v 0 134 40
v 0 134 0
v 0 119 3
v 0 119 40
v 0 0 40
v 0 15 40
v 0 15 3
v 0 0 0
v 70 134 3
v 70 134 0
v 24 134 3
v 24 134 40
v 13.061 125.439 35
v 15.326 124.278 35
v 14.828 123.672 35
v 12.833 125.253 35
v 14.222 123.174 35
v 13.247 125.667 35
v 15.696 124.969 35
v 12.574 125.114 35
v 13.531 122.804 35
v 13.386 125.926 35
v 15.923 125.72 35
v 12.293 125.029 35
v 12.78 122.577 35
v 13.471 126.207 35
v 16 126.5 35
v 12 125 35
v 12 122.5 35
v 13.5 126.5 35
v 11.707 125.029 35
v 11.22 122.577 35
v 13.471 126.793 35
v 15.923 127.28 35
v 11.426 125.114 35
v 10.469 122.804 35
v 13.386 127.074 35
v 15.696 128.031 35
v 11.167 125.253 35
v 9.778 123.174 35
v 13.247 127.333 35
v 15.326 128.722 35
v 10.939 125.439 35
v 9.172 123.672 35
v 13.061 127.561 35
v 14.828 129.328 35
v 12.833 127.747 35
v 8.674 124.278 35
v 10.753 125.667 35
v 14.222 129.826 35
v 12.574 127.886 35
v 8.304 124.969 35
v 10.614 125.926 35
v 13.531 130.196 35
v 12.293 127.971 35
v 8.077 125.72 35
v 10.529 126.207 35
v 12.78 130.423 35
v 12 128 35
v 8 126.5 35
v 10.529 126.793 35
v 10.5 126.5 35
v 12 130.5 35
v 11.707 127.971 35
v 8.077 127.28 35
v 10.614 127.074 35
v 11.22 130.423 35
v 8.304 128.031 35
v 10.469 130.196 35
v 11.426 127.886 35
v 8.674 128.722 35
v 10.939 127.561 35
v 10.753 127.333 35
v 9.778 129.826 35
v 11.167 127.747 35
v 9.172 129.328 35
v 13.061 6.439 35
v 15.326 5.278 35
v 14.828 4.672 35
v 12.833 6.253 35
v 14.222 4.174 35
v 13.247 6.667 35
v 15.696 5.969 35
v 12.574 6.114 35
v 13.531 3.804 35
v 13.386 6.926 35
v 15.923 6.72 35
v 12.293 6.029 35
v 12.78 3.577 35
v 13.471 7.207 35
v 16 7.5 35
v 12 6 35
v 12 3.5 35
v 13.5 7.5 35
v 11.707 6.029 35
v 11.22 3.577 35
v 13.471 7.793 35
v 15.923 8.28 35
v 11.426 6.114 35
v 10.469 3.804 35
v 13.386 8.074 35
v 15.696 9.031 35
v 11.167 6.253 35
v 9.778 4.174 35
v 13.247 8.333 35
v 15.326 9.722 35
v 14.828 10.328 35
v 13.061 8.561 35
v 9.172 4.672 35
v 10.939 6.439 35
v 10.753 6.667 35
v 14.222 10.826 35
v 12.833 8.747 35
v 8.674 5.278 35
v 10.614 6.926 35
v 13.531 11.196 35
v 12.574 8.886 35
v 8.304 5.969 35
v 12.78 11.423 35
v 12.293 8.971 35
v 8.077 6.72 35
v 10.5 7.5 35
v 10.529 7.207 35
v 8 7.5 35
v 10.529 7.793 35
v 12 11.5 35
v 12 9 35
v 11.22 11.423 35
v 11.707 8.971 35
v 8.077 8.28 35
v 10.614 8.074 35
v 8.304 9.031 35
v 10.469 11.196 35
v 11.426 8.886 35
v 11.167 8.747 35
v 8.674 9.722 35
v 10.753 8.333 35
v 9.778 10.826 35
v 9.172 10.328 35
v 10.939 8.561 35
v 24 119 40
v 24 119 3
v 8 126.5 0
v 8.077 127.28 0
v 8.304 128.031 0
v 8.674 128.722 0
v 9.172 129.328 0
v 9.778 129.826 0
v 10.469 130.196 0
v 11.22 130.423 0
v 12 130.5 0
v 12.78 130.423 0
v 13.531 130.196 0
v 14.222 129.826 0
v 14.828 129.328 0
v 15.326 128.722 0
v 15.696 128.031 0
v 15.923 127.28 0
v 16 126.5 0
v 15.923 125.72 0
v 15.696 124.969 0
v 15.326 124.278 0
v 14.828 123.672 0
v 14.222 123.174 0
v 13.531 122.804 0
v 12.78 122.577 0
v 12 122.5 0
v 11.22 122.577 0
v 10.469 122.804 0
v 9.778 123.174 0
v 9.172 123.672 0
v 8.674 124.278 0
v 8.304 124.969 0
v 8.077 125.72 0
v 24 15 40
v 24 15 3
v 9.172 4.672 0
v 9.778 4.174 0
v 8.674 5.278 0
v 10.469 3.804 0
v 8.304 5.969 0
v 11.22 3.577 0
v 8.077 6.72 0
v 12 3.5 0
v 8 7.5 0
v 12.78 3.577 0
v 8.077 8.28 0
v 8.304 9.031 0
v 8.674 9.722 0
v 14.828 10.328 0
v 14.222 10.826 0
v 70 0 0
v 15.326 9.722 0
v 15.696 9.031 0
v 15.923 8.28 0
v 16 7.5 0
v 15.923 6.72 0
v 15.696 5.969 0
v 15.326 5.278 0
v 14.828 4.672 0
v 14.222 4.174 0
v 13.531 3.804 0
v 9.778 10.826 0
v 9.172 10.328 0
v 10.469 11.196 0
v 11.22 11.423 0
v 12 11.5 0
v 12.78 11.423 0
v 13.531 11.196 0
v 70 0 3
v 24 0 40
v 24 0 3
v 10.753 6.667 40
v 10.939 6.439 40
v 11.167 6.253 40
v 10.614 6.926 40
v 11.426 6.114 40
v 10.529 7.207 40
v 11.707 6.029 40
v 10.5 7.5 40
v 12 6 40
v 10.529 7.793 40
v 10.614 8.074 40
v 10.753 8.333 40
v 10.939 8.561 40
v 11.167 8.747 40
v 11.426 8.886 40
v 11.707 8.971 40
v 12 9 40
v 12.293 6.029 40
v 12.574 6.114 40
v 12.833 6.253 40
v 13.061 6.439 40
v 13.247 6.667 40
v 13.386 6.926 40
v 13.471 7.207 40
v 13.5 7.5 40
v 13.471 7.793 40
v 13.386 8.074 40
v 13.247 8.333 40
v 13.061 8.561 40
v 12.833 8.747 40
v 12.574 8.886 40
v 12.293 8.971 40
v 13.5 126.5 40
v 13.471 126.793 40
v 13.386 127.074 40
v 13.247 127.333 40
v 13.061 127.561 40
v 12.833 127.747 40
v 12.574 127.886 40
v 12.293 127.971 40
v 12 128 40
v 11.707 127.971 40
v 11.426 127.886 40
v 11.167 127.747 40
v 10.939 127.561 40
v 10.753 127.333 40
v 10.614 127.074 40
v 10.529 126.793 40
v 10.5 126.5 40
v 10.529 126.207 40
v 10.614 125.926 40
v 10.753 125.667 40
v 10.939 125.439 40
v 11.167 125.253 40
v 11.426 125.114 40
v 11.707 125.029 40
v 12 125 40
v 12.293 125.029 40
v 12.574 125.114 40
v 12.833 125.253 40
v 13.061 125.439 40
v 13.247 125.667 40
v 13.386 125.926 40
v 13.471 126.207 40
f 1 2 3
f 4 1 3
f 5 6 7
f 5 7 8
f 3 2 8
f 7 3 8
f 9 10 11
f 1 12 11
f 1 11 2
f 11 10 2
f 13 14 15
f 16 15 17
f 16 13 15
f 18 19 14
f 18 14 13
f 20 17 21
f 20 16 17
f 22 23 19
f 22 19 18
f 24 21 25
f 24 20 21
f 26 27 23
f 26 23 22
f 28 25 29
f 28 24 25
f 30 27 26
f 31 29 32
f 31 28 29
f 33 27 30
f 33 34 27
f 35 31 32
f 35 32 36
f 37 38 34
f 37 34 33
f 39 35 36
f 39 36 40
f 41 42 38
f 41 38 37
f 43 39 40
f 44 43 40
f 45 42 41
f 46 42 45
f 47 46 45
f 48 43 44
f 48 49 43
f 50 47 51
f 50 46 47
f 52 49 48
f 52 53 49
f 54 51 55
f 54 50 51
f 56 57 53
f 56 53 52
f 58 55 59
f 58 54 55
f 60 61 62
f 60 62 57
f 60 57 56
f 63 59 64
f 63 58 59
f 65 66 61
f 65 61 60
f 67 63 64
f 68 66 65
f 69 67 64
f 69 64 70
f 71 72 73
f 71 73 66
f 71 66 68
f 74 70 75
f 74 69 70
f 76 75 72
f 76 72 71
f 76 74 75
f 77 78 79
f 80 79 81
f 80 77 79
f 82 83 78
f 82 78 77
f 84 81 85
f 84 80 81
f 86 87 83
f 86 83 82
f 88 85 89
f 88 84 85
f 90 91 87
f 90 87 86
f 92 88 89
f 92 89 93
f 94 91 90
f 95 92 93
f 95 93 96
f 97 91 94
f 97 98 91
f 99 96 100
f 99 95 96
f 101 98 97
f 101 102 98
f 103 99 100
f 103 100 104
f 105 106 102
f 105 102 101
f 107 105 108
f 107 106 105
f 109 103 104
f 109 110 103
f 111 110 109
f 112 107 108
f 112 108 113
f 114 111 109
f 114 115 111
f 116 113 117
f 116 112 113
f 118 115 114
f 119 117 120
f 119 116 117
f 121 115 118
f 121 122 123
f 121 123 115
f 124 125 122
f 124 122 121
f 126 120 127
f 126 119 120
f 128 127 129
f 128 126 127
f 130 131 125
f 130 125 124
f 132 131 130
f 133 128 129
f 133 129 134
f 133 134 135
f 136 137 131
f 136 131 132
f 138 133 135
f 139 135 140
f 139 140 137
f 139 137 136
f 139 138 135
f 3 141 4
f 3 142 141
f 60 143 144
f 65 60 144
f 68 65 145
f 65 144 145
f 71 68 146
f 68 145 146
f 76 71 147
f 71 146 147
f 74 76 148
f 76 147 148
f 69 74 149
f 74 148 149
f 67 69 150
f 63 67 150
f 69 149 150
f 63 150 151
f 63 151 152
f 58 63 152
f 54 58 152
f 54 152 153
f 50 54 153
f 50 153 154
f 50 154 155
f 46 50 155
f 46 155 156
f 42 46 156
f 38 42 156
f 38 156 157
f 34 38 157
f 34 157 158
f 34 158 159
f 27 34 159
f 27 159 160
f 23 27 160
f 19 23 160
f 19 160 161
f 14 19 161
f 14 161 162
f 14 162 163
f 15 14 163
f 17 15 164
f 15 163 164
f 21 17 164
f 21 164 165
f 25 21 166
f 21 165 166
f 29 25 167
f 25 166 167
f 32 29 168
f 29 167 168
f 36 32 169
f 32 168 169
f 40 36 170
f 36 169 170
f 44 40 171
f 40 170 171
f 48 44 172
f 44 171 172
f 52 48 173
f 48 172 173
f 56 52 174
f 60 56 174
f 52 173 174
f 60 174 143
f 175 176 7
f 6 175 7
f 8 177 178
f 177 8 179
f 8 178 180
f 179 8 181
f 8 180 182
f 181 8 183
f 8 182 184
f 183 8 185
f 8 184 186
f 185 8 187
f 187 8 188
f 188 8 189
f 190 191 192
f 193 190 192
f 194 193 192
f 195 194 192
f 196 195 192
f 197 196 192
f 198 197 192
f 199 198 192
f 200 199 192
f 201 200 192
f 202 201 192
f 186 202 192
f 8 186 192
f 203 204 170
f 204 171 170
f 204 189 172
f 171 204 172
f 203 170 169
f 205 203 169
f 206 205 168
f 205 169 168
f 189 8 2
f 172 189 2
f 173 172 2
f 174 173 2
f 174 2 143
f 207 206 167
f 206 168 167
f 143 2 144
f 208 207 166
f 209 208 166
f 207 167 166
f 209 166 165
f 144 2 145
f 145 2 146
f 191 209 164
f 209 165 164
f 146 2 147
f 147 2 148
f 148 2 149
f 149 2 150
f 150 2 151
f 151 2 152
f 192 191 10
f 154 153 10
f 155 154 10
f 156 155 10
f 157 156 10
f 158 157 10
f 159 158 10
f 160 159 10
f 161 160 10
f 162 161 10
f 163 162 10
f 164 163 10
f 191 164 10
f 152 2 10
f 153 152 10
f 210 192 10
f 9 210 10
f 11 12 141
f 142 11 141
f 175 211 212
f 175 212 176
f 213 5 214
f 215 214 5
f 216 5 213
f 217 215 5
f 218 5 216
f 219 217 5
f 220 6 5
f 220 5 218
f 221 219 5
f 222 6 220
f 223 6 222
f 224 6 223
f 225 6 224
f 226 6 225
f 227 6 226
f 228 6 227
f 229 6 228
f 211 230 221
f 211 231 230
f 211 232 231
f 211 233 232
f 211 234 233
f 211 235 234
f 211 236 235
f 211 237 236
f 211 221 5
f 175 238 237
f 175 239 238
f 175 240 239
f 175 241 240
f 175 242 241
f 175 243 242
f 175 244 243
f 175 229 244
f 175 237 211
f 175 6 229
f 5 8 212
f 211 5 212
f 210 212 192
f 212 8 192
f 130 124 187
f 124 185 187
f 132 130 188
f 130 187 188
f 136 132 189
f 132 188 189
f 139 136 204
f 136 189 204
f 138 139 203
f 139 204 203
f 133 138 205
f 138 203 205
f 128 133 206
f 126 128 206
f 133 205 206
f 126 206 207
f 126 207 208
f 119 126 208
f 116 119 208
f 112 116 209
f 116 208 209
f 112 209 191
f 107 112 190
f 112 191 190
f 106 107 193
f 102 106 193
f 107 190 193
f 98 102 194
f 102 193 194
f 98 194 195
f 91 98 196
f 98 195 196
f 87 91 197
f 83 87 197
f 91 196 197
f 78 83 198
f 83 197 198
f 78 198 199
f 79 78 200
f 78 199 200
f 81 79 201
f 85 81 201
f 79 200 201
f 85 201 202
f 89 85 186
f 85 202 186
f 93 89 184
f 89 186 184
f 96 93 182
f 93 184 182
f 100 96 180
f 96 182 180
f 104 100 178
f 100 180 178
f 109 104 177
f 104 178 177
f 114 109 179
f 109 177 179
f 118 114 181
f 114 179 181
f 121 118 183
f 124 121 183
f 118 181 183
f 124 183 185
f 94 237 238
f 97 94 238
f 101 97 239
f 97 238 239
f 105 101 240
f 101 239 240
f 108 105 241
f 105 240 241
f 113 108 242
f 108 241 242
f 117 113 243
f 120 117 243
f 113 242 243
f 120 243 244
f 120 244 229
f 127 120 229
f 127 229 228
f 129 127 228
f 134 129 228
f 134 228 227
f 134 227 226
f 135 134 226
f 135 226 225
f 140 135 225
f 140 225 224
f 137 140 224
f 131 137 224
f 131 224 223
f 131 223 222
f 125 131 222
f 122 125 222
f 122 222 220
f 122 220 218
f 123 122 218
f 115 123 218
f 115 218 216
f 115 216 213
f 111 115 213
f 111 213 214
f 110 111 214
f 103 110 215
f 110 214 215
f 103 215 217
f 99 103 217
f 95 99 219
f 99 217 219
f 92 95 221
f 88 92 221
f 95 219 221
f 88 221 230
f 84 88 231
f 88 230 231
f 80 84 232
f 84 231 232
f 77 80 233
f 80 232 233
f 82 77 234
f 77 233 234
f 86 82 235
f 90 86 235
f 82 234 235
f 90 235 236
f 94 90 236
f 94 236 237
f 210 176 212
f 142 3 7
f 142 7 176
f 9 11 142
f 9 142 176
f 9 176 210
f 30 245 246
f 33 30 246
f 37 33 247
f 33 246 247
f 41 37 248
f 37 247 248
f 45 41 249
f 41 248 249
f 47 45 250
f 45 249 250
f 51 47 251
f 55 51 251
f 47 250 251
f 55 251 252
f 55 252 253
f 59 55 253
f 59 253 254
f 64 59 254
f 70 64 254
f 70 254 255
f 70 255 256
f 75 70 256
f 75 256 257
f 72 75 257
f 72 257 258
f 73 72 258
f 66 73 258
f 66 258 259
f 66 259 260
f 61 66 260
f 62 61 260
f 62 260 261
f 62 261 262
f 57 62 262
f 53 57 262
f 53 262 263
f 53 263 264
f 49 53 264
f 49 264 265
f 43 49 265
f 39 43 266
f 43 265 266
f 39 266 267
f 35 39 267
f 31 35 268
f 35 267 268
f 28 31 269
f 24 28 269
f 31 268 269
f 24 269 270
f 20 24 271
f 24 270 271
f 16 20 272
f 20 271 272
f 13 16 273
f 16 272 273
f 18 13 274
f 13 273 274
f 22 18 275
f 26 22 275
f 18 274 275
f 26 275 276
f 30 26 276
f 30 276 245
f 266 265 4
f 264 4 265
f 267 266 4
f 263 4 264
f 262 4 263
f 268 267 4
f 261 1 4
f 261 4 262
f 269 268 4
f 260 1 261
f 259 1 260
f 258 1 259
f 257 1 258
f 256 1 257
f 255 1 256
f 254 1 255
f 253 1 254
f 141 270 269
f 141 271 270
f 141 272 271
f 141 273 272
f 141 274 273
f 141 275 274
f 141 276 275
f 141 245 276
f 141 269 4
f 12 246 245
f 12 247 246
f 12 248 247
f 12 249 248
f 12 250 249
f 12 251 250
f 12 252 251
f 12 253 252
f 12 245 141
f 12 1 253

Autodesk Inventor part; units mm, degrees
ref_plane "YZ Plane" through (0, 0, 0) normal (1, 0, 0) x (0, 1, 0)
ref_plane "XZ Plane" through (0, 0, 0) normal (0, 1, 0) x (-1, 0, 0)
ref_plane "XY Plane" through (0, 0, 0) normal (0, 0, 1) x (1, 0, 0)
sketch "Sketch1" plane through (0, 0, 0) normal (0, 0, 1) x (1, 0, 0)
  line L0 (0, 0) -> (70, 0)
  line L1 (70, 0) -> (70, 134)
  line L2 (70, 134) -> (0, 134)
  line L3 (0, 134) -> (0, 0)
  dimension "d0" = 70
  dimension "d1" = 134
extrude "Extrusion1" add sketch "Sketch1" along normal blind 3
sketch "Sketch2" plane through (0, 0, 3) normal (0, 0, 1) x (1, 0, 0)
  line L0 (70, 134) -> (0, 134) projected
  line L1 (0, 134) -> (24, 134)
  line L2 (24, 134) -> (24, 119)
  line L3 (24, 119) -> (0, 119)
  line L4 (0, 119) -> (0, 134)
  line L5 (0, 0) -> (24, 0)
  line L6 (24, 0) -> (24, 15)
  line L7 (24, 15) -> (0, 15)
  line L8 (0, 15) -> (0, 0)
  dimension "d4" = 24
  dimension "d5" = 15
  dimension "d6" = 24
  dimension "d7" = 15
extrude "Extrusion2" add sketch "Sketch2" along normal blind 37
sketch "Sketch3" plane through (0, 0, 40) normal (0, 0, 1) x (1, 0, 0)
  line L0 (24, 134) -> (0, 134) construction
  line L1 (0, 134) -> (0, 119) construction
  line L2 (0, 119) -> (24, 119) construction
  line L3 (24, 119) -> (24, 134) construction
  line L4 (0, 0) -> (24, 0) construction
  line L5 (24, 0) -> (24, 15) construction
  line L6 (24, 15) -> (0, 15) construction
  line L7 (0, 15) -> (0, 0) construction
  circle A0 centre (12, 126.5) radius 1.5
  circle A1 centre (12, 7.5) radius 1.5
  point P0 (24, 126.5)
  point P1 (24, 7.5)
  point P2 (12, 15)
  point P3 (12, 119)
  dimension "d10" = 3
  dimension "d11" = 3
extrude "Extrusion3" cut sketch "Sketch3" against normal through all
sketch "Sketch4" plane through (0, 0, 0) normal (0, 0, -1) x (-1, 0, 0)
  circle A0 centre (-12, 126.5) radius 1.5 projected
  circle A1 centre (-12, 7.5) radius 1.5 projected
  circle A2 centre (-12, 126.5) radius 4
  circle A3 centre (-12, 7.5) radius 4
  point P0 (0, 0)
  dimension "d14" = 8
  dimension "d15" = 8
extrude "Extrusion4" cut sketch "Sketch4" against normal blind 35 contours A0 | A1 | A2 | A3
properties part number "BP009" material "ABS Plastic"
